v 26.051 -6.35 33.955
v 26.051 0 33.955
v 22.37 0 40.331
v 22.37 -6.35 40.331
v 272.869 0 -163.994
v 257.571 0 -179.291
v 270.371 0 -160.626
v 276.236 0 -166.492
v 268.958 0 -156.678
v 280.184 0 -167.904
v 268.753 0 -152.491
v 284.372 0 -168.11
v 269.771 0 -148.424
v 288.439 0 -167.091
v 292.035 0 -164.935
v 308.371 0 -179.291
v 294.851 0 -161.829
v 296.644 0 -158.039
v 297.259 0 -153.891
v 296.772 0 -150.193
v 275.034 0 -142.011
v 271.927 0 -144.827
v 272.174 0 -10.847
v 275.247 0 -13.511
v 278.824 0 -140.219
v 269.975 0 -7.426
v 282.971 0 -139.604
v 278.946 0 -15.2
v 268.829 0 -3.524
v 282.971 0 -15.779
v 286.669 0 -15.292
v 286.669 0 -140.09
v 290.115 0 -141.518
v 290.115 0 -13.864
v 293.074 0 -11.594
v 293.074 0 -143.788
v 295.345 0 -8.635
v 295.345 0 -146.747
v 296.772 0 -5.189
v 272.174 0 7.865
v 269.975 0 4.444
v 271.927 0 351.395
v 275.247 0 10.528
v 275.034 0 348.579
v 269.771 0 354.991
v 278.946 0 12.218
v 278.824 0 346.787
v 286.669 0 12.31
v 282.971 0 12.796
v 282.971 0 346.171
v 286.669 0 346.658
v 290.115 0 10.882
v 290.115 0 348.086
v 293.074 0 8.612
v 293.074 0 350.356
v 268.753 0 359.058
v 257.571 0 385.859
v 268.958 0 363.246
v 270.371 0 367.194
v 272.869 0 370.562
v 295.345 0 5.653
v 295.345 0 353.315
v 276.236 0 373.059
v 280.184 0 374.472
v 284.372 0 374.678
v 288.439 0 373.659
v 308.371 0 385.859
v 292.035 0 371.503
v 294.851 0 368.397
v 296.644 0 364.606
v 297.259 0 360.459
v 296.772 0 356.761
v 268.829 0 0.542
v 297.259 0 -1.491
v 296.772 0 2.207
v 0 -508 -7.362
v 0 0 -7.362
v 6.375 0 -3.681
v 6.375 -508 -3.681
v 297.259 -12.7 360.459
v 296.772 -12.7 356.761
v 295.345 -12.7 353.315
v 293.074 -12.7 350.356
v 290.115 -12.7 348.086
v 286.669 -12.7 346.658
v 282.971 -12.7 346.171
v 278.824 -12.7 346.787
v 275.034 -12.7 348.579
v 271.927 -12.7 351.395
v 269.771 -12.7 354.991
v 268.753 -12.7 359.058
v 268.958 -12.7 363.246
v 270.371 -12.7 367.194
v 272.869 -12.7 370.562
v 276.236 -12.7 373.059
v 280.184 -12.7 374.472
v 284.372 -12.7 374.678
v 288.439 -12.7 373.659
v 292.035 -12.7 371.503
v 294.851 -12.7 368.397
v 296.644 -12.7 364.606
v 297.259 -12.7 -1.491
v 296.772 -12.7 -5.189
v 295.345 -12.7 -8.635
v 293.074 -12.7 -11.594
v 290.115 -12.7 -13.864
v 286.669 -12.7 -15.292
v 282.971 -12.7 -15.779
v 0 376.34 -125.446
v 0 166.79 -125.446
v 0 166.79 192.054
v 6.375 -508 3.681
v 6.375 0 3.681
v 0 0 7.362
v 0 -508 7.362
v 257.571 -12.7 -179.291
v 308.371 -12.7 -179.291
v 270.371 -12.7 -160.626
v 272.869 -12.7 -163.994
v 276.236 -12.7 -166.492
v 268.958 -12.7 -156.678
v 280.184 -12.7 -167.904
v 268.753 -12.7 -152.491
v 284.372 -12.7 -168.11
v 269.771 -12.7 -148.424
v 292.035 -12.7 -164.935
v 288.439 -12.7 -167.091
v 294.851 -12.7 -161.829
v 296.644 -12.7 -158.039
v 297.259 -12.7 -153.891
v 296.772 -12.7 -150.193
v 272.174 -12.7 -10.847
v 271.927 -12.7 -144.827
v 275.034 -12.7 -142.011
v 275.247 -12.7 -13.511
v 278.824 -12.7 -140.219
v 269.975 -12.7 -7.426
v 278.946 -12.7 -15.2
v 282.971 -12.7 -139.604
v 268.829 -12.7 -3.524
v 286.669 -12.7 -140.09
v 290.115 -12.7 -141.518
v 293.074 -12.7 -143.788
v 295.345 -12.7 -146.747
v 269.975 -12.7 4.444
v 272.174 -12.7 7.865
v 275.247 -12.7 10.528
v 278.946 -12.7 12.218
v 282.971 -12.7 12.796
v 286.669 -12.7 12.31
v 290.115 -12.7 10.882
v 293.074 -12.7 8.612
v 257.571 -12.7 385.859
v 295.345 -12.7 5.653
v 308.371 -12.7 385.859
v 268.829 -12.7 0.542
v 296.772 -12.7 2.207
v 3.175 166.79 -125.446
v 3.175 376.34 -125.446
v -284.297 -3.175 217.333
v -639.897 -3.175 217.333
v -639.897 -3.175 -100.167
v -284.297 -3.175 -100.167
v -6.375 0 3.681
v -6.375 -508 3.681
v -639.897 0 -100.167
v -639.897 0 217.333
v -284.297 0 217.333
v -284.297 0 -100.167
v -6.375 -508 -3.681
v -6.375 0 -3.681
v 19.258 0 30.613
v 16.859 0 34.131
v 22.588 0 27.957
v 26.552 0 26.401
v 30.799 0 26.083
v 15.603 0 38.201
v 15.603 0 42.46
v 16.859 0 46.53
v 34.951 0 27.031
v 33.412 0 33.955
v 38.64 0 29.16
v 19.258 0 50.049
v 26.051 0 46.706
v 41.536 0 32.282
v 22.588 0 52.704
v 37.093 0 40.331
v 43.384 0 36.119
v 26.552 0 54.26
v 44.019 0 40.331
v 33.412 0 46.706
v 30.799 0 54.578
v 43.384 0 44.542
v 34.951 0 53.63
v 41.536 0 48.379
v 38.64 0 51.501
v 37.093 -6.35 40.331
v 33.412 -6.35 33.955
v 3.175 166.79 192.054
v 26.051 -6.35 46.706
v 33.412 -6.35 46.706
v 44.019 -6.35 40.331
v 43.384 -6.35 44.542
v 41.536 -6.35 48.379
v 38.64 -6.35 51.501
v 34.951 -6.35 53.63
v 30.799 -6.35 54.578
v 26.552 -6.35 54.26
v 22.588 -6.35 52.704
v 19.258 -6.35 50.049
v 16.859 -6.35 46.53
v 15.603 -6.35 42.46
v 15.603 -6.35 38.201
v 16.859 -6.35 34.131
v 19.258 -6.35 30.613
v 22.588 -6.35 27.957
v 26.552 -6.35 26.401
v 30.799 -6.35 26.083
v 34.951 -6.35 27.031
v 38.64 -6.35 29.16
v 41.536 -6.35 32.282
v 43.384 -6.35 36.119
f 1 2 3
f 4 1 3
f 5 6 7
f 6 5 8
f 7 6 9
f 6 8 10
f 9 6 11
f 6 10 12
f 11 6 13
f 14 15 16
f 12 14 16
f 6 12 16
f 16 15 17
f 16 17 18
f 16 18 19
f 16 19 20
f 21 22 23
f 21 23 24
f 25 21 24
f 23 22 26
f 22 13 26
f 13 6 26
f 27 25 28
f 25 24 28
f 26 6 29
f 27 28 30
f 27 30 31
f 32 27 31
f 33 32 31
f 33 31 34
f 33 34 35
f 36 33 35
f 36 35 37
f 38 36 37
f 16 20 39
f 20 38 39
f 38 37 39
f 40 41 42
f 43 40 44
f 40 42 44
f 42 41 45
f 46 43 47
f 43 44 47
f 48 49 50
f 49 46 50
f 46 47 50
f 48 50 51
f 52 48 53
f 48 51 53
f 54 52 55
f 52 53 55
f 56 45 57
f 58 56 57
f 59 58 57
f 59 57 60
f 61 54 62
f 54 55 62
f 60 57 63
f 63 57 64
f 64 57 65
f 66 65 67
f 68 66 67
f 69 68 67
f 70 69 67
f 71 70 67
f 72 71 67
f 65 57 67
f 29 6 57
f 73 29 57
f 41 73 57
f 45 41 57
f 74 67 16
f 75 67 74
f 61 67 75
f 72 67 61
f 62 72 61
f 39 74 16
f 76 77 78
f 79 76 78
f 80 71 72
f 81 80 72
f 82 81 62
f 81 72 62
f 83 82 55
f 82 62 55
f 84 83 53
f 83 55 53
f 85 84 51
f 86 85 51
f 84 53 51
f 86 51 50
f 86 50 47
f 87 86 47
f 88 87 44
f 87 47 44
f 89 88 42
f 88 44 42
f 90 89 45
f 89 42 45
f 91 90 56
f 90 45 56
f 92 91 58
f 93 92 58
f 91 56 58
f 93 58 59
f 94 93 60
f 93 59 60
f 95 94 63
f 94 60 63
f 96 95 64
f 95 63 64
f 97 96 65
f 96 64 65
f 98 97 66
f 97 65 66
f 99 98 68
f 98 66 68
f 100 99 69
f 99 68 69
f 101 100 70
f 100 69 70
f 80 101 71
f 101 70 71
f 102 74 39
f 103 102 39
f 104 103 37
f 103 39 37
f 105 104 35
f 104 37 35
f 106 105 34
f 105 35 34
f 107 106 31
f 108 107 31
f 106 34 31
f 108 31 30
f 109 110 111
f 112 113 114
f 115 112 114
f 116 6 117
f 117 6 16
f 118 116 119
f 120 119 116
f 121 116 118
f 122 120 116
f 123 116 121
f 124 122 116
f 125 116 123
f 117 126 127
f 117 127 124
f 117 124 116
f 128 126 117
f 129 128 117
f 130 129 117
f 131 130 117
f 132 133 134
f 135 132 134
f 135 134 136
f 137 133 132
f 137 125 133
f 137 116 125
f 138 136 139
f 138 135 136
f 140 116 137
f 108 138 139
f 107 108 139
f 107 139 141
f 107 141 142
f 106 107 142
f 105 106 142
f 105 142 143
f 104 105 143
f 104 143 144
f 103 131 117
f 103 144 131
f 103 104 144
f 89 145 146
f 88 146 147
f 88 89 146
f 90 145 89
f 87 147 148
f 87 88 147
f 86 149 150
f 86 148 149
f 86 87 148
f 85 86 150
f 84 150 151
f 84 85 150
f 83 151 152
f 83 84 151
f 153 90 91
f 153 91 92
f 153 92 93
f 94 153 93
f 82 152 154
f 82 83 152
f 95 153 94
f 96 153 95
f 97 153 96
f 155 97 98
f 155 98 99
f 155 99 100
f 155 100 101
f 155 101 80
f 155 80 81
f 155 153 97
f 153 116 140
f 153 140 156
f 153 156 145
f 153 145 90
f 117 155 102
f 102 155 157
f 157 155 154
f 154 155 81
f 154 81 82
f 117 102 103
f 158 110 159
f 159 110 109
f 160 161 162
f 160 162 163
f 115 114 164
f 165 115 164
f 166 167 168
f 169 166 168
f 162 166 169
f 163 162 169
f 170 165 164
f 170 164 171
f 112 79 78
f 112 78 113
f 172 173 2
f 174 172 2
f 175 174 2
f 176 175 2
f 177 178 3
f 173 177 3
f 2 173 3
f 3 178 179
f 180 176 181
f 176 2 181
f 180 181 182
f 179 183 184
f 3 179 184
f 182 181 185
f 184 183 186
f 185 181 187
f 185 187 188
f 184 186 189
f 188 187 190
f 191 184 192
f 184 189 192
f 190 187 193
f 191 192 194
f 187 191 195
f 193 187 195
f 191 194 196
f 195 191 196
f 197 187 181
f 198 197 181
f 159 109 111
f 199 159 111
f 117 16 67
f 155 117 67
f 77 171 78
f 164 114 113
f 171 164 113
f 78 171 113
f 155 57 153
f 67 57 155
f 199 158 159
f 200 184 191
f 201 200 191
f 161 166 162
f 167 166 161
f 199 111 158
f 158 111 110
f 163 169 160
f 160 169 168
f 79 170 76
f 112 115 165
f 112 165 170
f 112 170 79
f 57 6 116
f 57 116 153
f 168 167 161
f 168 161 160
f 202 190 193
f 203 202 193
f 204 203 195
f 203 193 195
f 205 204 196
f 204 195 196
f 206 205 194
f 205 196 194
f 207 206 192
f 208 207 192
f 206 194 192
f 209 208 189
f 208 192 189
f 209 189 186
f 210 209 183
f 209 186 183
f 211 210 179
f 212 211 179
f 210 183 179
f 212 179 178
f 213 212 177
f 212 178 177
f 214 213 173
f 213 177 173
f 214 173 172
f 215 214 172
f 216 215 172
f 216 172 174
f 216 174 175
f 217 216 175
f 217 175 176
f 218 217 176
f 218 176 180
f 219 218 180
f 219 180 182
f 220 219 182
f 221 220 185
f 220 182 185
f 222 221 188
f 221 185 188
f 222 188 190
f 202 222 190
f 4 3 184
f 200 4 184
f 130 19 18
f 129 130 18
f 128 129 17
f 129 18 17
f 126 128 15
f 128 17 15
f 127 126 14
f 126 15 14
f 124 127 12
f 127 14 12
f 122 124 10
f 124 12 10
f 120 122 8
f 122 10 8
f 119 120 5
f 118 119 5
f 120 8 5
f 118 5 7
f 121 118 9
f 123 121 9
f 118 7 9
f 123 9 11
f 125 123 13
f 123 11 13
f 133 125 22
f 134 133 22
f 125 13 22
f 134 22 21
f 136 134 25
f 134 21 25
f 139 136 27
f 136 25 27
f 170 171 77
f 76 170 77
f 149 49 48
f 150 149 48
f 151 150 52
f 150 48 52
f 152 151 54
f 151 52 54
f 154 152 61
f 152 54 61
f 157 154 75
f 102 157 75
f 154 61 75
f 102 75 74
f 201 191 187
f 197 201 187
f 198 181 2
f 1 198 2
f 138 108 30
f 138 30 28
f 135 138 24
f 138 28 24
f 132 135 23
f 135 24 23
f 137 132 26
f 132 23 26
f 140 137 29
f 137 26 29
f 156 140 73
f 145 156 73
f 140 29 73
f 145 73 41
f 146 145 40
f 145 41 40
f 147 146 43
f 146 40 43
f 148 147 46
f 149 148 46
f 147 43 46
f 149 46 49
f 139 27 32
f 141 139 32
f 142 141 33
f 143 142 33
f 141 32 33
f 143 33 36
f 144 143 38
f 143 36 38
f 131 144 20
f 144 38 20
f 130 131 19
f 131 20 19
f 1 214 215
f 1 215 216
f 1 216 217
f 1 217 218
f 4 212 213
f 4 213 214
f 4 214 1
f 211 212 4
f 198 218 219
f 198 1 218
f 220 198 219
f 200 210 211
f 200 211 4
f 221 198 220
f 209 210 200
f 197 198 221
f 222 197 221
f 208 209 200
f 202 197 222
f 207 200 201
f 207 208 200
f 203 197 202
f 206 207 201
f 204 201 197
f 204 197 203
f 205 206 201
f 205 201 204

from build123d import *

# Parameters (mm, degrees)
F1_DEPTH = 508
F2_W     = 50.8
F2_H     = 565.15
F3_DEPTH = 12.7
F4_R     = 14.2875
F5_DEPTH = 6.35
F6_W     = 355.6
F6_H     = 317.5
F7_DEPTH = 3.175
F9_DEPTH = 3.175


with BuildPart() as f1:
    # F0 (on Front) → F1 (new body)
    with BuildSketch(Plane.XZ):
        Polygon((6.3754, -3.680839), (6.3754, 3.680839), (0, 7.361678), (-6.3754, 3.680839), (-6.3754, -3.680839), (0, -7.361678), align=None)
    extrude(amount=F1_DEPTH)


with BuildPart() as f3:
    # F2 (on Front) → F3 (new body)
    with BuildSketch(Plane.XZ):
        with Locations((282.97136, 103.283899)):
            Rectangle(F2_W, F2_H)
        with BuildLine():
            ThreePointArc((297.25886, -153.891101), (272.868572, -163.993889), (282.97136, -139.603601))
            ThreePointArc((282.97136, -139.603601), (293.074148, -143.788313), (297.25886, -153.891101))
        make_face(mode=Mode.SUBTRACT)
        with BuildLine():
            ThreePointArc((297.25886, -1.491101), (293.074148, -11.593889), (282.97136, -15.778601))
            ThreePointArc((282.97136, -15.778601), (268.68386, -1.491101), (282.97136, 12.796399))
            ThreePointArc((282.97136, 12.796399), (293.074148, 8.611687), (297.25886, -1.491101))
        make_face(mode=Mode.SUBTRACT)
        with BuildLine():
            ThreePointArc((297.25886, 360.458899), (293.074148, 350.356111), (282.97136, 346.171399))
            ThreePointArc((282.97136, 346.171399), (272.868572, 370.561687), (297.25886, 360.458899))
        make_face(mode=Mode.SUBTRACT)
    extrude(amount=F3_DEPTH)


with BuildPart() as f5:
    # F4 (on Front) → F5 (new body)
    with BuildSketch(Plane.XZ):
        with Locations((29.73141, 40.330604)):
            Circle(F4_R)
        Polygon((37.093087, 40.330604), (33.412249, 33.955204), (26.050571, 33.955204), (22.369732, 40.330604), (26.050571, 46.706004), (33.412249, 46.706004), align=None, mode=Mode.SUBTRACT)
    extrude(amount=F5_DEPTH)


with BuildPart() as f7:
    # F6 (on Front) → F7 (new body)
    with BuildSketch(Plane.XZ):
        with Locations((-462.097287, 58.583411)):
            Rectangle(F6_W, F6_H)
    extrude(amount=F7_DEPTH)


with BuildPart() as f9:
    # F8 (on Right) → F9 (new body)
    with BuildSketch(Plane.YZ):
        Polygon((376.340053, -125.446469), (166.790053, 192.053531), (166.790053, -125.446469), align=None)
    extrude(amount=F9_DEPTH)


solid = Compound([f1.part, f3.part, f5.part, f7.part, f9.part])
